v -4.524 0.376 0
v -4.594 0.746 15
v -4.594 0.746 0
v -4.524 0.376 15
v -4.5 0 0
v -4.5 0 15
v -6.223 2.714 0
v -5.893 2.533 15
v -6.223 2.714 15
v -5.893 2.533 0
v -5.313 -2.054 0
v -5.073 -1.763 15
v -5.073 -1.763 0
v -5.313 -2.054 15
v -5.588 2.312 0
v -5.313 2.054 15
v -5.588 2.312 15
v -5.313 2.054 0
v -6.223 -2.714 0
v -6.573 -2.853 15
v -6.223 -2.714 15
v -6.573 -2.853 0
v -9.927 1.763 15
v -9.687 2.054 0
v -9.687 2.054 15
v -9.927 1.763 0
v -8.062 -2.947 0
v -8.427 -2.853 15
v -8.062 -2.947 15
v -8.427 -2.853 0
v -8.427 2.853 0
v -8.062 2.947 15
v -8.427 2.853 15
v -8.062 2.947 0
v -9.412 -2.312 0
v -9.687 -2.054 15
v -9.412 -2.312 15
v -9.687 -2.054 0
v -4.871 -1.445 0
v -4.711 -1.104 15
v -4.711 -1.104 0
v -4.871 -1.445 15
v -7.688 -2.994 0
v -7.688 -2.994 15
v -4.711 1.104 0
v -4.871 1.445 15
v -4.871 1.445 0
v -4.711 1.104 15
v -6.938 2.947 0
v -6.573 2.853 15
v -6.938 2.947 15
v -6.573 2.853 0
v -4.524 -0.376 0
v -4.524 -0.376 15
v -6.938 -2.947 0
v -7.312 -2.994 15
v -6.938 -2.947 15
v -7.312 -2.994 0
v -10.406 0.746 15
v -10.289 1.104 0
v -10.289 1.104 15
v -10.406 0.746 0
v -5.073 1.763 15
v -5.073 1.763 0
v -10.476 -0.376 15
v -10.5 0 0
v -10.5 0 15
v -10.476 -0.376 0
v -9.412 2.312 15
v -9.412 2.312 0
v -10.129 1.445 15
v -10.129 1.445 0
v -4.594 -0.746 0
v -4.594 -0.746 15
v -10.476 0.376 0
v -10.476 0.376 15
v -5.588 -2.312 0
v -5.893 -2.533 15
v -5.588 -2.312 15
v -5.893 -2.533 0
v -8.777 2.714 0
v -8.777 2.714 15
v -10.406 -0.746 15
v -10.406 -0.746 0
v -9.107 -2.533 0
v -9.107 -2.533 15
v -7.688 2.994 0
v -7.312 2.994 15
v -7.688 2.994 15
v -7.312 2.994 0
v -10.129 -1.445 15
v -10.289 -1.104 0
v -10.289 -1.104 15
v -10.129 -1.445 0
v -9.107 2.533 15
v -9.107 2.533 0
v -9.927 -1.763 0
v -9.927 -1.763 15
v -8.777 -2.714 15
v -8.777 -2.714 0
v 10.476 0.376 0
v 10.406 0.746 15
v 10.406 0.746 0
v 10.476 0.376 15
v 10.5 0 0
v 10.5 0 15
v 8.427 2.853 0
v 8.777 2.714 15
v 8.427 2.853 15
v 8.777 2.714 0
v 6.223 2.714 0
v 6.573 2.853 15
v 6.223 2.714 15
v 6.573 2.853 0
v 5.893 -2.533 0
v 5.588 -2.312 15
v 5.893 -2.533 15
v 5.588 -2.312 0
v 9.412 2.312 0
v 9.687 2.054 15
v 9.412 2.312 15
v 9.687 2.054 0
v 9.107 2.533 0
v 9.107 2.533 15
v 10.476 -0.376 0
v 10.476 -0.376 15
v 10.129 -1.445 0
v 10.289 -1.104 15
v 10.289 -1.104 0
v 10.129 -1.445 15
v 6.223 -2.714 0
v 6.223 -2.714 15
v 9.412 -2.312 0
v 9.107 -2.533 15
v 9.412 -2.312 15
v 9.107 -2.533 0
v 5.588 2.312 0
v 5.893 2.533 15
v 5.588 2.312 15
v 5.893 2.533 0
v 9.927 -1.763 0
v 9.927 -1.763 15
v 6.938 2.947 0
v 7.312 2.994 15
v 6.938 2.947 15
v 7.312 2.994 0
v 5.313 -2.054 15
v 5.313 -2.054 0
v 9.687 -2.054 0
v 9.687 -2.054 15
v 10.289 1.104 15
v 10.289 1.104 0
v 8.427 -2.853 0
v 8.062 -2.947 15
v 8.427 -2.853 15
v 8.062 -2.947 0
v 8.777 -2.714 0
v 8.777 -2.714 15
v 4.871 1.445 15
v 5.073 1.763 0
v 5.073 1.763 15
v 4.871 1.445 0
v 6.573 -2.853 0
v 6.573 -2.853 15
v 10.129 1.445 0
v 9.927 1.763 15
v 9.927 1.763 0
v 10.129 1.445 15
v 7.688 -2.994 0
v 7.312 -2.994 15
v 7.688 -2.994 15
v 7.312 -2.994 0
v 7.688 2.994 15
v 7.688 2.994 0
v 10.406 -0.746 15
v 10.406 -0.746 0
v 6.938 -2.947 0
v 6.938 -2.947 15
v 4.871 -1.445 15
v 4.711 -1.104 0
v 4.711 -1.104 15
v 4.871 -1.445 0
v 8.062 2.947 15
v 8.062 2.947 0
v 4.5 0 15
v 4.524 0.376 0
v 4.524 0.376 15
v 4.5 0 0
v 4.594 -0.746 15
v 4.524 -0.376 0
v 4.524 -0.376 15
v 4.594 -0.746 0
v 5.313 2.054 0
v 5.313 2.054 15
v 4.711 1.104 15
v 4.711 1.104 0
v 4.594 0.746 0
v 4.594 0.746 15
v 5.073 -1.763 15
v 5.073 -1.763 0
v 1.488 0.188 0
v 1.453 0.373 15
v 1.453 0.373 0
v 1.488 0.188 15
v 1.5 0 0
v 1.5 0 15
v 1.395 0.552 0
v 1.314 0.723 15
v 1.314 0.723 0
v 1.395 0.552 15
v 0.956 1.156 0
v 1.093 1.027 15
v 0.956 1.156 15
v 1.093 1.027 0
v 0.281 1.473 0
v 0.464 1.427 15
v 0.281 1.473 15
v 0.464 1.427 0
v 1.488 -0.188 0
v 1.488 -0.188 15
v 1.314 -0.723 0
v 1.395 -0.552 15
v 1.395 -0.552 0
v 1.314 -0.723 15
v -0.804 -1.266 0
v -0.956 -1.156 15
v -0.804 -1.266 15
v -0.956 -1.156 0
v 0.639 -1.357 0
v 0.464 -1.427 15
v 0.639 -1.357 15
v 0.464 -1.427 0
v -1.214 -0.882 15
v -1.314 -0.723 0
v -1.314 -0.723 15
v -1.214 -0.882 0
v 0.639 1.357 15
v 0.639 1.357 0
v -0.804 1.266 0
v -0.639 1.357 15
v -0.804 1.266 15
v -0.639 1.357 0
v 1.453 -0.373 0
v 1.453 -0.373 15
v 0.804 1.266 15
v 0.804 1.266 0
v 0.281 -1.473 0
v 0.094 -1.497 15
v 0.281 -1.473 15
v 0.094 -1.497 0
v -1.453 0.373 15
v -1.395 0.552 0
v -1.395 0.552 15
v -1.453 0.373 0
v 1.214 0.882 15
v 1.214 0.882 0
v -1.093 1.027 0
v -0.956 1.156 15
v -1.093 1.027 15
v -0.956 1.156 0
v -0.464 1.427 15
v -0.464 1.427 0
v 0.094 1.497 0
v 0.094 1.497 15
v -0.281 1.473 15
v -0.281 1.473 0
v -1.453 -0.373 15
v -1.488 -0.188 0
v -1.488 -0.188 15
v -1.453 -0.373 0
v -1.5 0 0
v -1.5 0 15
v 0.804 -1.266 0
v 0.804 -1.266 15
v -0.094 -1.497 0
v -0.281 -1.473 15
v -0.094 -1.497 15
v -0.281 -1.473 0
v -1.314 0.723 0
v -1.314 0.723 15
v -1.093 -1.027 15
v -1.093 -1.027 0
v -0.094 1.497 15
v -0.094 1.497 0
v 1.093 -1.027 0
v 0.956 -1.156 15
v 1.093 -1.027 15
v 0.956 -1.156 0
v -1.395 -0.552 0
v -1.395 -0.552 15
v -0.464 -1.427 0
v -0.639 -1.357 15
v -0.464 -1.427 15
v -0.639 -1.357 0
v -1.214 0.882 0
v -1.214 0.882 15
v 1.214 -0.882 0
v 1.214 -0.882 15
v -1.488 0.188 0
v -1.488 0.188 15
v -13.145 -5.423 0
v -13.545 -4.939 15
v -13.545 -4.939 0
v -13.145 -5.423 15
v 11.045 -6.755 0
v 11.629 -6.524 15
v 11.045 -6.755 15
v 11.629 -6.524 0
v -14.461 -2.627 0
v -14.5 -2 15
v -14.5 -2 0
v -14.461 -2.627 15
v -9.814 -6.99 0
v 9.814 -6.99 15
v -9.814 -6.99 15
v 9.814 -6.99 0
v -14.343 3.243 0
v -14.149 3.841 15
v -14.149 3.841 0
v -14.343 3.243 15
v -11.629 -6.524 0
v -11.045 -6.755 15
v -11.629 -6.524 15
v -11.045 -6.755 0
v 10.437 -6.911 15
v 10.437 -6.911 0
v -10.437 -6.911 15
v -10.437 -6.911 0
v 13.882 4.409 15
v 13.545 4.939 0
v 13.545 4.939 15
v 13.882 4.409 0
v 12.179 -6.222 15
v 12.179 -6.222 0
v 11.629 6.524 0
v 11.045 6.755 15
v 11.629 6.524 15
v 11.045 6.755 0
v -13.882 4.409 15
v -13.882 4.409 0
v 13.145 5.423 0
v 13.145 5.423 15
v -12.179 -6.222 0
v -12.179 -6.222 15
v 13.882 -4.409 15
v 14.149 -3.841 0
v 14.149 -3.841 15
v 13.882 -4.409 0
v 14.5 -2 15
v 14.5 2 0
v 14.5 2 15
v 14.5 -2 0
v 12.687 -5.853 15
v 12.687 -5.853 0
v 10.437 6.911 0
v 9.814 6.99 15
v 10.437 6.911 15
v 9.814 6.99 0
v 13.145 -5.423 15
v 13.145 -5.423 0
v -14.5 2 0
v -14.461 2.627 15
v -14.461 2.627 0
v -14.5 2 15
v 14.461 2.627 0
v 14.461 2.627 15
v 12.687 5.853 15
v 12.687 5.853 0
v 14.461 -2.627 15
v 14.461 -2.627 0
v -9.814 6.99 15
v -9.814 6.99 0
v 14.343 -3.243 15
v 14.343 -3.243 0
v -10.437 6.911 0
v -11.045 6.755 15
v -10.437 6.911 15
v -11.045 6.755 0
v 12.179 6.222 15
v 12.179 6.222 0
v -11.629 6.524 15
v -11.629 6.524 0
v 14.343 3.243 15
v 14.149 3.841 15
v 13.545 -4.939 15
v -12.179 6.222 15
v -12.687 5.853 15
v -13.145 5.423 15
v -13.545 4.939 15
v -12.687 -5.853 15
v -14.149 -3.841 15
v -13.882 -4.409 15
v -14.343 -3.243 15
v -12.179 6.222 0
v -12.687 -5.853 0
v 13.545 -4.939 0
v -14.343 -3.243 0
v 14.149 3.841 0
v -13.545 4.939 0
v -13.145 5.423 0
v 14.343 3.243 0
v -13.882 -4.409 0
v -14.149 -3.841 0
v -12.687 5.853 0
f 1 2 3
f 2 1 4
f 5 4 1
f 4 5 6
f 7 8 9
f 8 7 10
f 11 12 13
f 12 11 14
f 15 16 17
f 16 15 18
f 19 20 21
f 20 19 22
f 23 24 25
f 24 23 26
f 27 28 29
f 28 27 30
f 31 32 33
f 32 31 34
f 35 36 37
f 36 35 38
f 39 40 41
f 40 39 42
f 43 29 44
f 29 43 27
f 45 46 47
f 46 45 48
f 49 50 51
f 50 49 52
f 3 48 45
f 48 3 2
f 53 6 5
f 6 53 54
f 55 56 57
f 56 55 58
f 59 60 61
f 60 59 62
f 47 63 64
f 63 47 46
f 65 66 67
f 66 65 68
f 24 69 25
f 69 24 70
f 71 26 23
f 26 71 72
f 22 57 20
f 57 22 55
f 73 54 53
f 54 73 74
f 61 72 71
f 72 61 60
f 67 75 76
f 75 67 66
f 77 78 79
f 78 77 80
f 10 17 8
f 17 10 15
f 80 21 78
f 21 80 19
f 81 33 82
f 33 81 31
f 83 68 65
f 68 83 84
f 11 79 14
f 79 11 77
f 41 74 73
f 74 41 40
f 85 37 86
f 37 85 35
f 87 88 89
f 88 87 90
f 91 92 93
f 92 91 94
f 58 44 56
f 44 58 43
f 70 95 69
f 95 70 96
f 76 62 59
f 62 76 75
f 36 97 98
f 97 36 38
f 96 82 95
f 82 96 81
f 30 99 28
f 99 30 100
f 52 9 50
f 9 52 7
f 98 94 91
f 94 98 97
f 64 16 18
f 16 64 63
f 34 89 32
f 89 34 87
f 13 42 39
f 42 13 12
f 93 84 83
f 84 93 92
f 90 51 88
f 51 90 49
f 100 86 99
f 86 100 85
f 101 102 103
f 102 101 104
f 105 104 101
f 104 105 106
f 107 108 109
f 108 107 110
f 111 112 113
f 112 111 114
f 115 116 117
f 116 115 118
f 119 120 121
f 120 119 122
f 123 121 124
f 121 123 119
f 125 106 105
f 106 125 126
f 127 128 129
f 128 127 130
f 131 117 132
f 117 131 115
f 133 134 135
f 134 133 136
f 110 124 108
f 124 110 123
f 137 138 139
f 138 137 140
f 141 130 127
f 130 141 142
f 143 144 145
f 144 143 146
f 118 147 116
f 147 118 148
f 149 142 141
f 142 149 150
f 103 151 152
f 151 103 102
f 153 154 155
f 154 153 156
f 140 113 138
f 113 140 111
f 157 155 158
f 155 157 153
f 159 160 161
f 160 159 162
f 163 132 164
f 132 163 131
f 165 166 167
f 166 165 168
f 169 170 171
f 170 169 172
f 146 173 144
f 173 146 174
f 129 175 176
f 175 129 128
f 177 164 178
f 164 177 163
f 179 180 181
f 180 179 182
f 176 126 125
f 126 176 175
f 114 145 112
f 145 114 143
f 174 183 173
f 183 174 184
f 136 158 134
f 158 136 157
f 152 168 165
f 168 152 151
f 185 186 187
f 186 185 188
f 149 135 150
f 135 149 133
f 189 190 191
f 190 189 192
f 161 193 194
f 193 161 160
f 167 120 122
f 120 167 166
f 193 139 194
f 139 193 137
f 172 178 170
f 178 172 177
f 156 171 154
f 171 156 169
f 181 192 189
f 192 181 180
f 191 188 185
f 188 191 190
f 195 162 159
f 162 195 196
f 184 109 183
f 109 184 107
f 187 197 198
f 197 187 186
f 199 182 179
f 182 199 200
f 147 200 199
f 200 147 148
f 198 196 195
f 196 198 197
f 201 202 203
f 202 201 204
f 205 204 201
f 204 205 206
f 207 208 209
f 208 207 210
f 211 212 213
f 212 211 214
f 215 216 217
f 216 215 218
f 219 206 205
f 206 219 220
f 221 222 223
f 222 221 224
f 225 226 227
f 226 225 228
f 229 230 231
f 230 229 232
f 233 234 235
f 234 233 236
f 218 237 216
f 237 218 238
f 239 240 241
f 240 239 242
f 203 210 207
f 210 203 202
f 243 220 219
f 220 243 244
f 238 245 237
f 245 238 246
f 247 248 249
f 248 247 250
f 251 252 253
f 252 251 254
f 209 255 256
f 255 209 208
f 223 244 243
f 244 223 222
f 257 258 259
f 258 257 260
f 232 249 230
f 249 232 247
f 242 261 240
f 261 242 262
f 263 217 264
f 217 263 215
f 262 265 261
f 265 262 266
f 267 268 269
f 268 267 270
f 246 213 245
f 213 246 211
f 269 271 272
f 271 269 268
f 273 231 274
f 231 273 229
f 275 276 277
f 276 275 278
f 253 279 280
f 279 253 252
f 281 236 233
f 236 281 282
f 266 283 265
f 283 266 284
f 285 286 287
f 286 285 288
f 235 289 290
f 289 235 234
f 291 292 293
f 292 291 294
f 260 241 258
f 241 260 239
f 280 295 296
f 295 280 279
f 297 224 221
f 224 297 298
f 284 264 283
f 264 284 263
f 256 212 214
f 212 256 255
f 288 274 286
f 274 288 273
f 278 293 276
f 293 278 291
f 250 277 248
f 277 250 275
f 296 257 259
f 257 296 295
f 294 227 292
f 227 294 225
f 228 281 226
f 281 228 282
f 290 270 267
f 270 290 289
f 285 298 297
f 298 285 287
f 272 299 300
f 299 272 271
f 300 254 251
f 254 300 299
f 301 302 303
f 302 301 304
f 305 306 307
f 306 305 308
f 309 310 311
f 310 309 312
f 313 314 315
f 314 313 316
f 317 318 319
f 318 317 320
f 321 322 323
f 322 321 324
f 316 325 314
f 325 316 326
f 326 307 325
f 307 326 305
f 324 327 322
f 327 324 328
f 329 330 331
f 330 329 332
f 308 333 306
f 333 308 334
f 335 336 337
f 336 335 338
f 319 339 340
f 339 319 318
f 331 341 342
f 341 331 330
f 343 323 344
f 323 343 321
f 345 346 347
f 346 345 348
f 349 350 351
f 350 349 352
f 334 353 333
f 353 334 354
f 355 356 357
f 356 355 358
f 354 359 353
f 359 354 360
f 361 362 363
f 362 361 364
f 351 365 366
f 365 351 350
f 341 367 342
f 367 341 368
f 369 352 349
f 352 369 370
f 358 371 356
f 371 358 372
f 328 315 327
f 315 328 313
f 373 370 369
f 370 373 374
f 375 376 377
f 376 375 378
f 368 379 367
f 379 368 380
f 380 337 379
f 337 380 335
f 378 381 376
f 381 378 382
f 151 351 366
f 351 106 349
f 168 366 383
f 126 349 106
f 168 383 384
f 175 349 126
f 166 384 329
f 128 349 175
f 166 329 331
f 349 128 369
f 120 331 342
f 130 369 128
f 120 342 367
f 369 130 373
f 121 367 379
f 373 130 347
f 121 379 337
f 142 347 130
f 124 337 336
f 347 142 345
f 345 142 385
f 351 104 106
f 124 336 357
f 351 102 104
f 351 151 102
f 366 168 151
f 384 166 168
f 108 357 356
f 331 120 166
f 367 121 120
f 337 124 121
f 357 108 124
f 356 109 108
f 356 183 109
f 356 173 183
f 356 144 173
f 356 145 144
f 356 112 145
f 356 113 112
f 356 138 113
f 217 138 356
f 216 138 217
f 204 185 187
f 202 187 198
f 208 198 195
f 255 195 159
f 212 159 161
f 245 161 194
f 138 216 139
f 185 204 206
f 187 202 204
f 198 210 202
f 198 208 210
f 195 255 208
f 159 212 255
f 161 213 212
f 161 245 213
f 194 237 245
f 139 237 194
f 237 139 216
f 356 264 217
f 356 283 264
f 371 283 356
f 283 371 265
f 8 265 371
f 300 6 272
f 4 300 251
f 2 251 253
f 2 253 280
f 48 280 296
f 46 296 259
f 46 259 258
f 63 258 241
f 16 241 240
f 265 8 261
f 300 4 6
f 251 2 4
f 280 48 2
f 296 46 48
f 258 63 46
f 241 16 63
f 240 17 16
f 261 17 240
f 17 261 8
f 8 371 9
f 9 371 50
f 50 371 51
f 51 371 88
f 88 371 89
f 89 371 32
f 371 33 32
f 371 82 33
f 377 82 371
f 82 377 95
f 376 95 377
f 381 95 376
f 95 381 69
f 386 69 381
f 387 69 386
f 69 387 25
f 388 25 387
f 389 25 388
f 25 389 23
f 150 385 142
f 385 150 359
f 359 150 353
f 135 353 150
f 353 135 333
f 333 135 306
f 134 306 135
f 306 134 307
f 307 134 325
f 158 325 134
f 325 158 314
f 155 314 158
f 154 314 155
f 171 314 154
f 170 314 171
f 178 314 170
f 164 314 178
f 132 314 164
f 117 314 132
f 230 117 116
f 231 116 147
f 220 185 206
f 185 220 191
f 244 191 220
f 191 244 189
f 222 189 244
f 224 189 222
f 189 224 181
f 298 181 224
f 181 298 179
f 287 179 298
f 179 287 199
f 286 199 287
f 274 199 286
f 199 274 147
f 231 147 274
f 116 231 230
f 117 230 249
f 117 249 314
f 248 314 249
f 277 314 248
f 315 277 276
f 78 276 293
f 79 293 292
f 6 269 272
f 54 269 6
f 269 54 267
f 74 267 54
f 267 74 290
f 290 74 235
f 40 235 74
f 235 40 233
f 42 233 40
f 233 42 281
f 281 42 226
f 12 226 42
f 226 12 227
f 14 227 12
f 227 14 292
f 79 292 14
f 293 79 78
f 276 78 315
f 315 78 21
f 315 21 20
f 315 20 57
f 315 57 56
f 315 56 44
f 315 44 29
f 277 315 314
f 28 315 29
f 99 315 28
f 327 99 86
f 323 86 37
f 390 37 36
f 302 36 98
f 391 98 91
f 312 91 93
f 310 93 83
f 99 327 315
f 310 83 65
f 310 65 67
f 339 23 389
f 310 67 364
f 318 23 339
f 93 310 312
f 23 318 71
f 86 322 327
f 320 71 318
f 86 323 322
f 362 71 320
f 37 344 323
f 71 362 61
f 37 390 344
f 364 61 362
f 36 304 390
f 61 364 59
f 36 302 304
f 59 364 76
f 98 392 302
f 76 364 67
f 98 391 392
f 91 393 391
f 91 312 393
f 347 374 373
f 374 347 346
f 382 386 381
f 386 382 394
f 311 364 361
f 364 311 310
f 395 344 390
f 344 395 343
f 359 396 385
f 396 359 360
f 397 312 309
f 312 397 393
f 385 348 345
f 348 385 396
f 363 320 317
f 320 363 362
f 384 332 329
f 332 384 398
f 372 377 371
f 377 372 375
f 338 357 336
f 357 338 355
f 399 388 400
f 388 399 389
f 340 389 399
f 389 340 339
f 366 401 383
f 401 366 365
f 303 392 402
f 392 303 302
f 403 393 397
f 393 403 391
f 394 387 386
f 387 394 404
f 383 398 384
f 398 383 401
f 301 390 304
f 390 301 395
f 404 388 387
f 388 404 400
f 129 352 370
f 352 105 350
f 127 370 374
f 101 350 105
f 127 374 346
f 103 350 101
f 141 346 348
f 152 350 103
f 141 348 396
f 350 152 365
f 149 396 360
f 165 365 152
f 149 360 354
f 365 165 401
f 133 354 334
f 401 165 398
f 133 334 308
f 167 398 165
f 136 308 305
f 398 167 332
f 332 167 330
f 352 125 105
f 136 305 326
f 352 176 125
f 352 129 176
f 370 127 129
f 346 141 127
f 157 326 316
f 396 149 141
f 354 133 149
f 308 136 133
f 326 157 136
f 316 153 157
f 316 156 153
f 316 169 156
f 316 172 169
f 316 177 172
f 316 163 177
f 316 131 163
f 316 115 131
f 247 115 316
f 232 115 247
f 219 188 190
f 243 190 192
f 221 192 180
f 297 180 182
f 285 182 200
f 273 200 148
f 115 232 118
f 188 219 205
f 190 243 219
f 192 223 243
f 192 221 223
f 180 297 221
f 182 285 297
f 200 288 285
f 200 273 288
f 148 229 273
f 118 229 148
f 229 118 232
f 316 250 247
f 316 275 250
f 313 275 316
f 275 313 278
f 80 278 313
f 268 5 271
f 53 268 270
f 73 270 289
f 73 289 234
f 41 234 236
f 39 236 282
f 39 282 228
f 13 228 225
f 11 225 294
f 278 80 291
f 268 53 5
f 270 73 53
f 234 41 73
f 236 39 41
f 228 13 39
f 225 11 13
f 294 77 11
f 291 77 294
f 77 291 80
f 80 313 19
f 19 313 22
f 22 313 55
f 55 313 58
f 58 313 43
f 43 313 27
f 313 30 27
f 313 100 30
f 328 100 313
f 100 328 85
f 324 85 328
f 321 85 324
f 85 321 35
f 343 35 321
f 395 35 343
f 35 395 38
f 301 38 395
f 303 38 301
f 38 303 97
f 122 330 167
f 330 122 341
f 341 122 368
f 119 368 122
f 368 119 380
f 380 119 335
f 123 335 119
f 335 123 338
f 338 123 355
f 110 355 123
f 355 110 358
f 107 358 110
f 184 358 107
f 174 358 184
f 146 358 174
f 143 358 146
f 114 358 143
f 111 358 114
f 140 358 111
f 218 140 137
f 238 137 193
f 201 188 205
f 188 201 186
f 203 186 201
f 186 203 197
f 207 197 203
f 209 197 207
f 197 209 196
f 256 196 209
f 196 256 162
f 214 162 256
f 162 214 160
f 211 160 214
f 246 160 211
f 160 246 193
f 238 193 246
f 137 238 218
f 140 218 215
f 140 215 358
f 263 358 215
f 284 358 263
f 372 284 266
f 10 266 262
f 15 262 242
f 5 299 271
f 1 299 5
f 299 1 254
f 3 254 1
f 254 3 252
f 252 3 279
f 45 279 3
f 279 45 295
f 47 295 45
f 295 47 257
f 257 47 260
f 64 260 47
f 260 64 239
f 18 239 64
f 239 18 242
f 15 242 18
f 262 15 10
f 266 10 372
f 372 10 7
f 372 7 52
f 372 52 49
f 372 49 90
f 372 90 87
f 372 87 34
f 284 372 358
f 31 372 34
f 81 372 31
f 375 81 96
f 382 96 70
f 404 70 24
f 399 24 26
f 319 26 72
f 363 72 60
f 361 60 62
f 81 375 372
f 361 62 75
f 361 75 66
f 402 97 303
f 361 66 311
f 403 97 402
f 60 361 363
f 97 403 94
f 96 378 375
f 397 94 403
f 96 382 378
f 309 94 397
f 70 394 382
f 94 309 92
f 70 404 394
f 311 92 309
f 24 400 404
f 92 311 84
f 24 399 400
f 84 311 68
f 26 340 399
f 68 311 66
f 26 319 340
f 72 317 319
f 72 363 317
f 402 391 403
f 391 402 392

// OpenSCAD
$fn = 50;


difference() {
	union() {
		*color(alpha = 1.0000000000, c = "gray") {
			translate(v = [0, 7, 0]) {
				linear_extrude(height = 1) {
					text(font = "Arial:style=Bold", halign = "center", size = 4.5000000000, text = "COMMENT plate main", valign = "center");
				}
			}
		}
		hull() {
			translate(v = [-9.5000000000, 2.0000000000, 0]) {
				cylinder(h = 15, r = 5);
			}
			translate(v = [9.5000000000, 2.0000000000, 0]) {
				cylinder(h = 15, r = 5);
			}
			translate(v = [-9.5000000000, -2.0000000000, 0]) {
				cylinder(h = 15, r = 5);
			}
			translate(v = [9.5000000000, -2.0000000000, 0]) {
				cylinder(h = 15, r = 5);
			}
		}
	}
	union() {
		*color(alpha = 1.0000000000, c = "gray") {
			translate(v = [0, 7, 0]) {
				linear_extrude(height = 1) {
					text(font = "Arial:style=Bold", halign = "center", size = 4.5000000000, text = "COMMENT holes main", valign = "center");
				}
			}
		}
		translate(v = [-7.5000000000, 0.0000000000, 0]) {
			translate(v = [0, 0, -100]) {
				cylinder(h = 200, r = 3.0000000000);
			}
		}
		translate(v = [7.5000000000, 0.0000000000, 0]) {
			translate(v = [0, 0, -100]) {
				cylinder(h = 200, r = 3.0000000000);
			}
		}
		translate(v = [-7.5000000000, 0.0000000000, 0]) {
			translate(v = [0, 0, -100]) {
				cylinder(h = 200, r = 1.5000000000);
			}
		}
		translate(v = [0, 0, -100]) {
			cylinder(h = 200, r = 1.5000000000);
		}
		translate(v = [7.5000000000, 0.0000000000, 0]) {
			translate(v = [0, 0, -100]) {
				cylinder(h = 200, r = 1.5000000000);
			}
		}
	}
}
